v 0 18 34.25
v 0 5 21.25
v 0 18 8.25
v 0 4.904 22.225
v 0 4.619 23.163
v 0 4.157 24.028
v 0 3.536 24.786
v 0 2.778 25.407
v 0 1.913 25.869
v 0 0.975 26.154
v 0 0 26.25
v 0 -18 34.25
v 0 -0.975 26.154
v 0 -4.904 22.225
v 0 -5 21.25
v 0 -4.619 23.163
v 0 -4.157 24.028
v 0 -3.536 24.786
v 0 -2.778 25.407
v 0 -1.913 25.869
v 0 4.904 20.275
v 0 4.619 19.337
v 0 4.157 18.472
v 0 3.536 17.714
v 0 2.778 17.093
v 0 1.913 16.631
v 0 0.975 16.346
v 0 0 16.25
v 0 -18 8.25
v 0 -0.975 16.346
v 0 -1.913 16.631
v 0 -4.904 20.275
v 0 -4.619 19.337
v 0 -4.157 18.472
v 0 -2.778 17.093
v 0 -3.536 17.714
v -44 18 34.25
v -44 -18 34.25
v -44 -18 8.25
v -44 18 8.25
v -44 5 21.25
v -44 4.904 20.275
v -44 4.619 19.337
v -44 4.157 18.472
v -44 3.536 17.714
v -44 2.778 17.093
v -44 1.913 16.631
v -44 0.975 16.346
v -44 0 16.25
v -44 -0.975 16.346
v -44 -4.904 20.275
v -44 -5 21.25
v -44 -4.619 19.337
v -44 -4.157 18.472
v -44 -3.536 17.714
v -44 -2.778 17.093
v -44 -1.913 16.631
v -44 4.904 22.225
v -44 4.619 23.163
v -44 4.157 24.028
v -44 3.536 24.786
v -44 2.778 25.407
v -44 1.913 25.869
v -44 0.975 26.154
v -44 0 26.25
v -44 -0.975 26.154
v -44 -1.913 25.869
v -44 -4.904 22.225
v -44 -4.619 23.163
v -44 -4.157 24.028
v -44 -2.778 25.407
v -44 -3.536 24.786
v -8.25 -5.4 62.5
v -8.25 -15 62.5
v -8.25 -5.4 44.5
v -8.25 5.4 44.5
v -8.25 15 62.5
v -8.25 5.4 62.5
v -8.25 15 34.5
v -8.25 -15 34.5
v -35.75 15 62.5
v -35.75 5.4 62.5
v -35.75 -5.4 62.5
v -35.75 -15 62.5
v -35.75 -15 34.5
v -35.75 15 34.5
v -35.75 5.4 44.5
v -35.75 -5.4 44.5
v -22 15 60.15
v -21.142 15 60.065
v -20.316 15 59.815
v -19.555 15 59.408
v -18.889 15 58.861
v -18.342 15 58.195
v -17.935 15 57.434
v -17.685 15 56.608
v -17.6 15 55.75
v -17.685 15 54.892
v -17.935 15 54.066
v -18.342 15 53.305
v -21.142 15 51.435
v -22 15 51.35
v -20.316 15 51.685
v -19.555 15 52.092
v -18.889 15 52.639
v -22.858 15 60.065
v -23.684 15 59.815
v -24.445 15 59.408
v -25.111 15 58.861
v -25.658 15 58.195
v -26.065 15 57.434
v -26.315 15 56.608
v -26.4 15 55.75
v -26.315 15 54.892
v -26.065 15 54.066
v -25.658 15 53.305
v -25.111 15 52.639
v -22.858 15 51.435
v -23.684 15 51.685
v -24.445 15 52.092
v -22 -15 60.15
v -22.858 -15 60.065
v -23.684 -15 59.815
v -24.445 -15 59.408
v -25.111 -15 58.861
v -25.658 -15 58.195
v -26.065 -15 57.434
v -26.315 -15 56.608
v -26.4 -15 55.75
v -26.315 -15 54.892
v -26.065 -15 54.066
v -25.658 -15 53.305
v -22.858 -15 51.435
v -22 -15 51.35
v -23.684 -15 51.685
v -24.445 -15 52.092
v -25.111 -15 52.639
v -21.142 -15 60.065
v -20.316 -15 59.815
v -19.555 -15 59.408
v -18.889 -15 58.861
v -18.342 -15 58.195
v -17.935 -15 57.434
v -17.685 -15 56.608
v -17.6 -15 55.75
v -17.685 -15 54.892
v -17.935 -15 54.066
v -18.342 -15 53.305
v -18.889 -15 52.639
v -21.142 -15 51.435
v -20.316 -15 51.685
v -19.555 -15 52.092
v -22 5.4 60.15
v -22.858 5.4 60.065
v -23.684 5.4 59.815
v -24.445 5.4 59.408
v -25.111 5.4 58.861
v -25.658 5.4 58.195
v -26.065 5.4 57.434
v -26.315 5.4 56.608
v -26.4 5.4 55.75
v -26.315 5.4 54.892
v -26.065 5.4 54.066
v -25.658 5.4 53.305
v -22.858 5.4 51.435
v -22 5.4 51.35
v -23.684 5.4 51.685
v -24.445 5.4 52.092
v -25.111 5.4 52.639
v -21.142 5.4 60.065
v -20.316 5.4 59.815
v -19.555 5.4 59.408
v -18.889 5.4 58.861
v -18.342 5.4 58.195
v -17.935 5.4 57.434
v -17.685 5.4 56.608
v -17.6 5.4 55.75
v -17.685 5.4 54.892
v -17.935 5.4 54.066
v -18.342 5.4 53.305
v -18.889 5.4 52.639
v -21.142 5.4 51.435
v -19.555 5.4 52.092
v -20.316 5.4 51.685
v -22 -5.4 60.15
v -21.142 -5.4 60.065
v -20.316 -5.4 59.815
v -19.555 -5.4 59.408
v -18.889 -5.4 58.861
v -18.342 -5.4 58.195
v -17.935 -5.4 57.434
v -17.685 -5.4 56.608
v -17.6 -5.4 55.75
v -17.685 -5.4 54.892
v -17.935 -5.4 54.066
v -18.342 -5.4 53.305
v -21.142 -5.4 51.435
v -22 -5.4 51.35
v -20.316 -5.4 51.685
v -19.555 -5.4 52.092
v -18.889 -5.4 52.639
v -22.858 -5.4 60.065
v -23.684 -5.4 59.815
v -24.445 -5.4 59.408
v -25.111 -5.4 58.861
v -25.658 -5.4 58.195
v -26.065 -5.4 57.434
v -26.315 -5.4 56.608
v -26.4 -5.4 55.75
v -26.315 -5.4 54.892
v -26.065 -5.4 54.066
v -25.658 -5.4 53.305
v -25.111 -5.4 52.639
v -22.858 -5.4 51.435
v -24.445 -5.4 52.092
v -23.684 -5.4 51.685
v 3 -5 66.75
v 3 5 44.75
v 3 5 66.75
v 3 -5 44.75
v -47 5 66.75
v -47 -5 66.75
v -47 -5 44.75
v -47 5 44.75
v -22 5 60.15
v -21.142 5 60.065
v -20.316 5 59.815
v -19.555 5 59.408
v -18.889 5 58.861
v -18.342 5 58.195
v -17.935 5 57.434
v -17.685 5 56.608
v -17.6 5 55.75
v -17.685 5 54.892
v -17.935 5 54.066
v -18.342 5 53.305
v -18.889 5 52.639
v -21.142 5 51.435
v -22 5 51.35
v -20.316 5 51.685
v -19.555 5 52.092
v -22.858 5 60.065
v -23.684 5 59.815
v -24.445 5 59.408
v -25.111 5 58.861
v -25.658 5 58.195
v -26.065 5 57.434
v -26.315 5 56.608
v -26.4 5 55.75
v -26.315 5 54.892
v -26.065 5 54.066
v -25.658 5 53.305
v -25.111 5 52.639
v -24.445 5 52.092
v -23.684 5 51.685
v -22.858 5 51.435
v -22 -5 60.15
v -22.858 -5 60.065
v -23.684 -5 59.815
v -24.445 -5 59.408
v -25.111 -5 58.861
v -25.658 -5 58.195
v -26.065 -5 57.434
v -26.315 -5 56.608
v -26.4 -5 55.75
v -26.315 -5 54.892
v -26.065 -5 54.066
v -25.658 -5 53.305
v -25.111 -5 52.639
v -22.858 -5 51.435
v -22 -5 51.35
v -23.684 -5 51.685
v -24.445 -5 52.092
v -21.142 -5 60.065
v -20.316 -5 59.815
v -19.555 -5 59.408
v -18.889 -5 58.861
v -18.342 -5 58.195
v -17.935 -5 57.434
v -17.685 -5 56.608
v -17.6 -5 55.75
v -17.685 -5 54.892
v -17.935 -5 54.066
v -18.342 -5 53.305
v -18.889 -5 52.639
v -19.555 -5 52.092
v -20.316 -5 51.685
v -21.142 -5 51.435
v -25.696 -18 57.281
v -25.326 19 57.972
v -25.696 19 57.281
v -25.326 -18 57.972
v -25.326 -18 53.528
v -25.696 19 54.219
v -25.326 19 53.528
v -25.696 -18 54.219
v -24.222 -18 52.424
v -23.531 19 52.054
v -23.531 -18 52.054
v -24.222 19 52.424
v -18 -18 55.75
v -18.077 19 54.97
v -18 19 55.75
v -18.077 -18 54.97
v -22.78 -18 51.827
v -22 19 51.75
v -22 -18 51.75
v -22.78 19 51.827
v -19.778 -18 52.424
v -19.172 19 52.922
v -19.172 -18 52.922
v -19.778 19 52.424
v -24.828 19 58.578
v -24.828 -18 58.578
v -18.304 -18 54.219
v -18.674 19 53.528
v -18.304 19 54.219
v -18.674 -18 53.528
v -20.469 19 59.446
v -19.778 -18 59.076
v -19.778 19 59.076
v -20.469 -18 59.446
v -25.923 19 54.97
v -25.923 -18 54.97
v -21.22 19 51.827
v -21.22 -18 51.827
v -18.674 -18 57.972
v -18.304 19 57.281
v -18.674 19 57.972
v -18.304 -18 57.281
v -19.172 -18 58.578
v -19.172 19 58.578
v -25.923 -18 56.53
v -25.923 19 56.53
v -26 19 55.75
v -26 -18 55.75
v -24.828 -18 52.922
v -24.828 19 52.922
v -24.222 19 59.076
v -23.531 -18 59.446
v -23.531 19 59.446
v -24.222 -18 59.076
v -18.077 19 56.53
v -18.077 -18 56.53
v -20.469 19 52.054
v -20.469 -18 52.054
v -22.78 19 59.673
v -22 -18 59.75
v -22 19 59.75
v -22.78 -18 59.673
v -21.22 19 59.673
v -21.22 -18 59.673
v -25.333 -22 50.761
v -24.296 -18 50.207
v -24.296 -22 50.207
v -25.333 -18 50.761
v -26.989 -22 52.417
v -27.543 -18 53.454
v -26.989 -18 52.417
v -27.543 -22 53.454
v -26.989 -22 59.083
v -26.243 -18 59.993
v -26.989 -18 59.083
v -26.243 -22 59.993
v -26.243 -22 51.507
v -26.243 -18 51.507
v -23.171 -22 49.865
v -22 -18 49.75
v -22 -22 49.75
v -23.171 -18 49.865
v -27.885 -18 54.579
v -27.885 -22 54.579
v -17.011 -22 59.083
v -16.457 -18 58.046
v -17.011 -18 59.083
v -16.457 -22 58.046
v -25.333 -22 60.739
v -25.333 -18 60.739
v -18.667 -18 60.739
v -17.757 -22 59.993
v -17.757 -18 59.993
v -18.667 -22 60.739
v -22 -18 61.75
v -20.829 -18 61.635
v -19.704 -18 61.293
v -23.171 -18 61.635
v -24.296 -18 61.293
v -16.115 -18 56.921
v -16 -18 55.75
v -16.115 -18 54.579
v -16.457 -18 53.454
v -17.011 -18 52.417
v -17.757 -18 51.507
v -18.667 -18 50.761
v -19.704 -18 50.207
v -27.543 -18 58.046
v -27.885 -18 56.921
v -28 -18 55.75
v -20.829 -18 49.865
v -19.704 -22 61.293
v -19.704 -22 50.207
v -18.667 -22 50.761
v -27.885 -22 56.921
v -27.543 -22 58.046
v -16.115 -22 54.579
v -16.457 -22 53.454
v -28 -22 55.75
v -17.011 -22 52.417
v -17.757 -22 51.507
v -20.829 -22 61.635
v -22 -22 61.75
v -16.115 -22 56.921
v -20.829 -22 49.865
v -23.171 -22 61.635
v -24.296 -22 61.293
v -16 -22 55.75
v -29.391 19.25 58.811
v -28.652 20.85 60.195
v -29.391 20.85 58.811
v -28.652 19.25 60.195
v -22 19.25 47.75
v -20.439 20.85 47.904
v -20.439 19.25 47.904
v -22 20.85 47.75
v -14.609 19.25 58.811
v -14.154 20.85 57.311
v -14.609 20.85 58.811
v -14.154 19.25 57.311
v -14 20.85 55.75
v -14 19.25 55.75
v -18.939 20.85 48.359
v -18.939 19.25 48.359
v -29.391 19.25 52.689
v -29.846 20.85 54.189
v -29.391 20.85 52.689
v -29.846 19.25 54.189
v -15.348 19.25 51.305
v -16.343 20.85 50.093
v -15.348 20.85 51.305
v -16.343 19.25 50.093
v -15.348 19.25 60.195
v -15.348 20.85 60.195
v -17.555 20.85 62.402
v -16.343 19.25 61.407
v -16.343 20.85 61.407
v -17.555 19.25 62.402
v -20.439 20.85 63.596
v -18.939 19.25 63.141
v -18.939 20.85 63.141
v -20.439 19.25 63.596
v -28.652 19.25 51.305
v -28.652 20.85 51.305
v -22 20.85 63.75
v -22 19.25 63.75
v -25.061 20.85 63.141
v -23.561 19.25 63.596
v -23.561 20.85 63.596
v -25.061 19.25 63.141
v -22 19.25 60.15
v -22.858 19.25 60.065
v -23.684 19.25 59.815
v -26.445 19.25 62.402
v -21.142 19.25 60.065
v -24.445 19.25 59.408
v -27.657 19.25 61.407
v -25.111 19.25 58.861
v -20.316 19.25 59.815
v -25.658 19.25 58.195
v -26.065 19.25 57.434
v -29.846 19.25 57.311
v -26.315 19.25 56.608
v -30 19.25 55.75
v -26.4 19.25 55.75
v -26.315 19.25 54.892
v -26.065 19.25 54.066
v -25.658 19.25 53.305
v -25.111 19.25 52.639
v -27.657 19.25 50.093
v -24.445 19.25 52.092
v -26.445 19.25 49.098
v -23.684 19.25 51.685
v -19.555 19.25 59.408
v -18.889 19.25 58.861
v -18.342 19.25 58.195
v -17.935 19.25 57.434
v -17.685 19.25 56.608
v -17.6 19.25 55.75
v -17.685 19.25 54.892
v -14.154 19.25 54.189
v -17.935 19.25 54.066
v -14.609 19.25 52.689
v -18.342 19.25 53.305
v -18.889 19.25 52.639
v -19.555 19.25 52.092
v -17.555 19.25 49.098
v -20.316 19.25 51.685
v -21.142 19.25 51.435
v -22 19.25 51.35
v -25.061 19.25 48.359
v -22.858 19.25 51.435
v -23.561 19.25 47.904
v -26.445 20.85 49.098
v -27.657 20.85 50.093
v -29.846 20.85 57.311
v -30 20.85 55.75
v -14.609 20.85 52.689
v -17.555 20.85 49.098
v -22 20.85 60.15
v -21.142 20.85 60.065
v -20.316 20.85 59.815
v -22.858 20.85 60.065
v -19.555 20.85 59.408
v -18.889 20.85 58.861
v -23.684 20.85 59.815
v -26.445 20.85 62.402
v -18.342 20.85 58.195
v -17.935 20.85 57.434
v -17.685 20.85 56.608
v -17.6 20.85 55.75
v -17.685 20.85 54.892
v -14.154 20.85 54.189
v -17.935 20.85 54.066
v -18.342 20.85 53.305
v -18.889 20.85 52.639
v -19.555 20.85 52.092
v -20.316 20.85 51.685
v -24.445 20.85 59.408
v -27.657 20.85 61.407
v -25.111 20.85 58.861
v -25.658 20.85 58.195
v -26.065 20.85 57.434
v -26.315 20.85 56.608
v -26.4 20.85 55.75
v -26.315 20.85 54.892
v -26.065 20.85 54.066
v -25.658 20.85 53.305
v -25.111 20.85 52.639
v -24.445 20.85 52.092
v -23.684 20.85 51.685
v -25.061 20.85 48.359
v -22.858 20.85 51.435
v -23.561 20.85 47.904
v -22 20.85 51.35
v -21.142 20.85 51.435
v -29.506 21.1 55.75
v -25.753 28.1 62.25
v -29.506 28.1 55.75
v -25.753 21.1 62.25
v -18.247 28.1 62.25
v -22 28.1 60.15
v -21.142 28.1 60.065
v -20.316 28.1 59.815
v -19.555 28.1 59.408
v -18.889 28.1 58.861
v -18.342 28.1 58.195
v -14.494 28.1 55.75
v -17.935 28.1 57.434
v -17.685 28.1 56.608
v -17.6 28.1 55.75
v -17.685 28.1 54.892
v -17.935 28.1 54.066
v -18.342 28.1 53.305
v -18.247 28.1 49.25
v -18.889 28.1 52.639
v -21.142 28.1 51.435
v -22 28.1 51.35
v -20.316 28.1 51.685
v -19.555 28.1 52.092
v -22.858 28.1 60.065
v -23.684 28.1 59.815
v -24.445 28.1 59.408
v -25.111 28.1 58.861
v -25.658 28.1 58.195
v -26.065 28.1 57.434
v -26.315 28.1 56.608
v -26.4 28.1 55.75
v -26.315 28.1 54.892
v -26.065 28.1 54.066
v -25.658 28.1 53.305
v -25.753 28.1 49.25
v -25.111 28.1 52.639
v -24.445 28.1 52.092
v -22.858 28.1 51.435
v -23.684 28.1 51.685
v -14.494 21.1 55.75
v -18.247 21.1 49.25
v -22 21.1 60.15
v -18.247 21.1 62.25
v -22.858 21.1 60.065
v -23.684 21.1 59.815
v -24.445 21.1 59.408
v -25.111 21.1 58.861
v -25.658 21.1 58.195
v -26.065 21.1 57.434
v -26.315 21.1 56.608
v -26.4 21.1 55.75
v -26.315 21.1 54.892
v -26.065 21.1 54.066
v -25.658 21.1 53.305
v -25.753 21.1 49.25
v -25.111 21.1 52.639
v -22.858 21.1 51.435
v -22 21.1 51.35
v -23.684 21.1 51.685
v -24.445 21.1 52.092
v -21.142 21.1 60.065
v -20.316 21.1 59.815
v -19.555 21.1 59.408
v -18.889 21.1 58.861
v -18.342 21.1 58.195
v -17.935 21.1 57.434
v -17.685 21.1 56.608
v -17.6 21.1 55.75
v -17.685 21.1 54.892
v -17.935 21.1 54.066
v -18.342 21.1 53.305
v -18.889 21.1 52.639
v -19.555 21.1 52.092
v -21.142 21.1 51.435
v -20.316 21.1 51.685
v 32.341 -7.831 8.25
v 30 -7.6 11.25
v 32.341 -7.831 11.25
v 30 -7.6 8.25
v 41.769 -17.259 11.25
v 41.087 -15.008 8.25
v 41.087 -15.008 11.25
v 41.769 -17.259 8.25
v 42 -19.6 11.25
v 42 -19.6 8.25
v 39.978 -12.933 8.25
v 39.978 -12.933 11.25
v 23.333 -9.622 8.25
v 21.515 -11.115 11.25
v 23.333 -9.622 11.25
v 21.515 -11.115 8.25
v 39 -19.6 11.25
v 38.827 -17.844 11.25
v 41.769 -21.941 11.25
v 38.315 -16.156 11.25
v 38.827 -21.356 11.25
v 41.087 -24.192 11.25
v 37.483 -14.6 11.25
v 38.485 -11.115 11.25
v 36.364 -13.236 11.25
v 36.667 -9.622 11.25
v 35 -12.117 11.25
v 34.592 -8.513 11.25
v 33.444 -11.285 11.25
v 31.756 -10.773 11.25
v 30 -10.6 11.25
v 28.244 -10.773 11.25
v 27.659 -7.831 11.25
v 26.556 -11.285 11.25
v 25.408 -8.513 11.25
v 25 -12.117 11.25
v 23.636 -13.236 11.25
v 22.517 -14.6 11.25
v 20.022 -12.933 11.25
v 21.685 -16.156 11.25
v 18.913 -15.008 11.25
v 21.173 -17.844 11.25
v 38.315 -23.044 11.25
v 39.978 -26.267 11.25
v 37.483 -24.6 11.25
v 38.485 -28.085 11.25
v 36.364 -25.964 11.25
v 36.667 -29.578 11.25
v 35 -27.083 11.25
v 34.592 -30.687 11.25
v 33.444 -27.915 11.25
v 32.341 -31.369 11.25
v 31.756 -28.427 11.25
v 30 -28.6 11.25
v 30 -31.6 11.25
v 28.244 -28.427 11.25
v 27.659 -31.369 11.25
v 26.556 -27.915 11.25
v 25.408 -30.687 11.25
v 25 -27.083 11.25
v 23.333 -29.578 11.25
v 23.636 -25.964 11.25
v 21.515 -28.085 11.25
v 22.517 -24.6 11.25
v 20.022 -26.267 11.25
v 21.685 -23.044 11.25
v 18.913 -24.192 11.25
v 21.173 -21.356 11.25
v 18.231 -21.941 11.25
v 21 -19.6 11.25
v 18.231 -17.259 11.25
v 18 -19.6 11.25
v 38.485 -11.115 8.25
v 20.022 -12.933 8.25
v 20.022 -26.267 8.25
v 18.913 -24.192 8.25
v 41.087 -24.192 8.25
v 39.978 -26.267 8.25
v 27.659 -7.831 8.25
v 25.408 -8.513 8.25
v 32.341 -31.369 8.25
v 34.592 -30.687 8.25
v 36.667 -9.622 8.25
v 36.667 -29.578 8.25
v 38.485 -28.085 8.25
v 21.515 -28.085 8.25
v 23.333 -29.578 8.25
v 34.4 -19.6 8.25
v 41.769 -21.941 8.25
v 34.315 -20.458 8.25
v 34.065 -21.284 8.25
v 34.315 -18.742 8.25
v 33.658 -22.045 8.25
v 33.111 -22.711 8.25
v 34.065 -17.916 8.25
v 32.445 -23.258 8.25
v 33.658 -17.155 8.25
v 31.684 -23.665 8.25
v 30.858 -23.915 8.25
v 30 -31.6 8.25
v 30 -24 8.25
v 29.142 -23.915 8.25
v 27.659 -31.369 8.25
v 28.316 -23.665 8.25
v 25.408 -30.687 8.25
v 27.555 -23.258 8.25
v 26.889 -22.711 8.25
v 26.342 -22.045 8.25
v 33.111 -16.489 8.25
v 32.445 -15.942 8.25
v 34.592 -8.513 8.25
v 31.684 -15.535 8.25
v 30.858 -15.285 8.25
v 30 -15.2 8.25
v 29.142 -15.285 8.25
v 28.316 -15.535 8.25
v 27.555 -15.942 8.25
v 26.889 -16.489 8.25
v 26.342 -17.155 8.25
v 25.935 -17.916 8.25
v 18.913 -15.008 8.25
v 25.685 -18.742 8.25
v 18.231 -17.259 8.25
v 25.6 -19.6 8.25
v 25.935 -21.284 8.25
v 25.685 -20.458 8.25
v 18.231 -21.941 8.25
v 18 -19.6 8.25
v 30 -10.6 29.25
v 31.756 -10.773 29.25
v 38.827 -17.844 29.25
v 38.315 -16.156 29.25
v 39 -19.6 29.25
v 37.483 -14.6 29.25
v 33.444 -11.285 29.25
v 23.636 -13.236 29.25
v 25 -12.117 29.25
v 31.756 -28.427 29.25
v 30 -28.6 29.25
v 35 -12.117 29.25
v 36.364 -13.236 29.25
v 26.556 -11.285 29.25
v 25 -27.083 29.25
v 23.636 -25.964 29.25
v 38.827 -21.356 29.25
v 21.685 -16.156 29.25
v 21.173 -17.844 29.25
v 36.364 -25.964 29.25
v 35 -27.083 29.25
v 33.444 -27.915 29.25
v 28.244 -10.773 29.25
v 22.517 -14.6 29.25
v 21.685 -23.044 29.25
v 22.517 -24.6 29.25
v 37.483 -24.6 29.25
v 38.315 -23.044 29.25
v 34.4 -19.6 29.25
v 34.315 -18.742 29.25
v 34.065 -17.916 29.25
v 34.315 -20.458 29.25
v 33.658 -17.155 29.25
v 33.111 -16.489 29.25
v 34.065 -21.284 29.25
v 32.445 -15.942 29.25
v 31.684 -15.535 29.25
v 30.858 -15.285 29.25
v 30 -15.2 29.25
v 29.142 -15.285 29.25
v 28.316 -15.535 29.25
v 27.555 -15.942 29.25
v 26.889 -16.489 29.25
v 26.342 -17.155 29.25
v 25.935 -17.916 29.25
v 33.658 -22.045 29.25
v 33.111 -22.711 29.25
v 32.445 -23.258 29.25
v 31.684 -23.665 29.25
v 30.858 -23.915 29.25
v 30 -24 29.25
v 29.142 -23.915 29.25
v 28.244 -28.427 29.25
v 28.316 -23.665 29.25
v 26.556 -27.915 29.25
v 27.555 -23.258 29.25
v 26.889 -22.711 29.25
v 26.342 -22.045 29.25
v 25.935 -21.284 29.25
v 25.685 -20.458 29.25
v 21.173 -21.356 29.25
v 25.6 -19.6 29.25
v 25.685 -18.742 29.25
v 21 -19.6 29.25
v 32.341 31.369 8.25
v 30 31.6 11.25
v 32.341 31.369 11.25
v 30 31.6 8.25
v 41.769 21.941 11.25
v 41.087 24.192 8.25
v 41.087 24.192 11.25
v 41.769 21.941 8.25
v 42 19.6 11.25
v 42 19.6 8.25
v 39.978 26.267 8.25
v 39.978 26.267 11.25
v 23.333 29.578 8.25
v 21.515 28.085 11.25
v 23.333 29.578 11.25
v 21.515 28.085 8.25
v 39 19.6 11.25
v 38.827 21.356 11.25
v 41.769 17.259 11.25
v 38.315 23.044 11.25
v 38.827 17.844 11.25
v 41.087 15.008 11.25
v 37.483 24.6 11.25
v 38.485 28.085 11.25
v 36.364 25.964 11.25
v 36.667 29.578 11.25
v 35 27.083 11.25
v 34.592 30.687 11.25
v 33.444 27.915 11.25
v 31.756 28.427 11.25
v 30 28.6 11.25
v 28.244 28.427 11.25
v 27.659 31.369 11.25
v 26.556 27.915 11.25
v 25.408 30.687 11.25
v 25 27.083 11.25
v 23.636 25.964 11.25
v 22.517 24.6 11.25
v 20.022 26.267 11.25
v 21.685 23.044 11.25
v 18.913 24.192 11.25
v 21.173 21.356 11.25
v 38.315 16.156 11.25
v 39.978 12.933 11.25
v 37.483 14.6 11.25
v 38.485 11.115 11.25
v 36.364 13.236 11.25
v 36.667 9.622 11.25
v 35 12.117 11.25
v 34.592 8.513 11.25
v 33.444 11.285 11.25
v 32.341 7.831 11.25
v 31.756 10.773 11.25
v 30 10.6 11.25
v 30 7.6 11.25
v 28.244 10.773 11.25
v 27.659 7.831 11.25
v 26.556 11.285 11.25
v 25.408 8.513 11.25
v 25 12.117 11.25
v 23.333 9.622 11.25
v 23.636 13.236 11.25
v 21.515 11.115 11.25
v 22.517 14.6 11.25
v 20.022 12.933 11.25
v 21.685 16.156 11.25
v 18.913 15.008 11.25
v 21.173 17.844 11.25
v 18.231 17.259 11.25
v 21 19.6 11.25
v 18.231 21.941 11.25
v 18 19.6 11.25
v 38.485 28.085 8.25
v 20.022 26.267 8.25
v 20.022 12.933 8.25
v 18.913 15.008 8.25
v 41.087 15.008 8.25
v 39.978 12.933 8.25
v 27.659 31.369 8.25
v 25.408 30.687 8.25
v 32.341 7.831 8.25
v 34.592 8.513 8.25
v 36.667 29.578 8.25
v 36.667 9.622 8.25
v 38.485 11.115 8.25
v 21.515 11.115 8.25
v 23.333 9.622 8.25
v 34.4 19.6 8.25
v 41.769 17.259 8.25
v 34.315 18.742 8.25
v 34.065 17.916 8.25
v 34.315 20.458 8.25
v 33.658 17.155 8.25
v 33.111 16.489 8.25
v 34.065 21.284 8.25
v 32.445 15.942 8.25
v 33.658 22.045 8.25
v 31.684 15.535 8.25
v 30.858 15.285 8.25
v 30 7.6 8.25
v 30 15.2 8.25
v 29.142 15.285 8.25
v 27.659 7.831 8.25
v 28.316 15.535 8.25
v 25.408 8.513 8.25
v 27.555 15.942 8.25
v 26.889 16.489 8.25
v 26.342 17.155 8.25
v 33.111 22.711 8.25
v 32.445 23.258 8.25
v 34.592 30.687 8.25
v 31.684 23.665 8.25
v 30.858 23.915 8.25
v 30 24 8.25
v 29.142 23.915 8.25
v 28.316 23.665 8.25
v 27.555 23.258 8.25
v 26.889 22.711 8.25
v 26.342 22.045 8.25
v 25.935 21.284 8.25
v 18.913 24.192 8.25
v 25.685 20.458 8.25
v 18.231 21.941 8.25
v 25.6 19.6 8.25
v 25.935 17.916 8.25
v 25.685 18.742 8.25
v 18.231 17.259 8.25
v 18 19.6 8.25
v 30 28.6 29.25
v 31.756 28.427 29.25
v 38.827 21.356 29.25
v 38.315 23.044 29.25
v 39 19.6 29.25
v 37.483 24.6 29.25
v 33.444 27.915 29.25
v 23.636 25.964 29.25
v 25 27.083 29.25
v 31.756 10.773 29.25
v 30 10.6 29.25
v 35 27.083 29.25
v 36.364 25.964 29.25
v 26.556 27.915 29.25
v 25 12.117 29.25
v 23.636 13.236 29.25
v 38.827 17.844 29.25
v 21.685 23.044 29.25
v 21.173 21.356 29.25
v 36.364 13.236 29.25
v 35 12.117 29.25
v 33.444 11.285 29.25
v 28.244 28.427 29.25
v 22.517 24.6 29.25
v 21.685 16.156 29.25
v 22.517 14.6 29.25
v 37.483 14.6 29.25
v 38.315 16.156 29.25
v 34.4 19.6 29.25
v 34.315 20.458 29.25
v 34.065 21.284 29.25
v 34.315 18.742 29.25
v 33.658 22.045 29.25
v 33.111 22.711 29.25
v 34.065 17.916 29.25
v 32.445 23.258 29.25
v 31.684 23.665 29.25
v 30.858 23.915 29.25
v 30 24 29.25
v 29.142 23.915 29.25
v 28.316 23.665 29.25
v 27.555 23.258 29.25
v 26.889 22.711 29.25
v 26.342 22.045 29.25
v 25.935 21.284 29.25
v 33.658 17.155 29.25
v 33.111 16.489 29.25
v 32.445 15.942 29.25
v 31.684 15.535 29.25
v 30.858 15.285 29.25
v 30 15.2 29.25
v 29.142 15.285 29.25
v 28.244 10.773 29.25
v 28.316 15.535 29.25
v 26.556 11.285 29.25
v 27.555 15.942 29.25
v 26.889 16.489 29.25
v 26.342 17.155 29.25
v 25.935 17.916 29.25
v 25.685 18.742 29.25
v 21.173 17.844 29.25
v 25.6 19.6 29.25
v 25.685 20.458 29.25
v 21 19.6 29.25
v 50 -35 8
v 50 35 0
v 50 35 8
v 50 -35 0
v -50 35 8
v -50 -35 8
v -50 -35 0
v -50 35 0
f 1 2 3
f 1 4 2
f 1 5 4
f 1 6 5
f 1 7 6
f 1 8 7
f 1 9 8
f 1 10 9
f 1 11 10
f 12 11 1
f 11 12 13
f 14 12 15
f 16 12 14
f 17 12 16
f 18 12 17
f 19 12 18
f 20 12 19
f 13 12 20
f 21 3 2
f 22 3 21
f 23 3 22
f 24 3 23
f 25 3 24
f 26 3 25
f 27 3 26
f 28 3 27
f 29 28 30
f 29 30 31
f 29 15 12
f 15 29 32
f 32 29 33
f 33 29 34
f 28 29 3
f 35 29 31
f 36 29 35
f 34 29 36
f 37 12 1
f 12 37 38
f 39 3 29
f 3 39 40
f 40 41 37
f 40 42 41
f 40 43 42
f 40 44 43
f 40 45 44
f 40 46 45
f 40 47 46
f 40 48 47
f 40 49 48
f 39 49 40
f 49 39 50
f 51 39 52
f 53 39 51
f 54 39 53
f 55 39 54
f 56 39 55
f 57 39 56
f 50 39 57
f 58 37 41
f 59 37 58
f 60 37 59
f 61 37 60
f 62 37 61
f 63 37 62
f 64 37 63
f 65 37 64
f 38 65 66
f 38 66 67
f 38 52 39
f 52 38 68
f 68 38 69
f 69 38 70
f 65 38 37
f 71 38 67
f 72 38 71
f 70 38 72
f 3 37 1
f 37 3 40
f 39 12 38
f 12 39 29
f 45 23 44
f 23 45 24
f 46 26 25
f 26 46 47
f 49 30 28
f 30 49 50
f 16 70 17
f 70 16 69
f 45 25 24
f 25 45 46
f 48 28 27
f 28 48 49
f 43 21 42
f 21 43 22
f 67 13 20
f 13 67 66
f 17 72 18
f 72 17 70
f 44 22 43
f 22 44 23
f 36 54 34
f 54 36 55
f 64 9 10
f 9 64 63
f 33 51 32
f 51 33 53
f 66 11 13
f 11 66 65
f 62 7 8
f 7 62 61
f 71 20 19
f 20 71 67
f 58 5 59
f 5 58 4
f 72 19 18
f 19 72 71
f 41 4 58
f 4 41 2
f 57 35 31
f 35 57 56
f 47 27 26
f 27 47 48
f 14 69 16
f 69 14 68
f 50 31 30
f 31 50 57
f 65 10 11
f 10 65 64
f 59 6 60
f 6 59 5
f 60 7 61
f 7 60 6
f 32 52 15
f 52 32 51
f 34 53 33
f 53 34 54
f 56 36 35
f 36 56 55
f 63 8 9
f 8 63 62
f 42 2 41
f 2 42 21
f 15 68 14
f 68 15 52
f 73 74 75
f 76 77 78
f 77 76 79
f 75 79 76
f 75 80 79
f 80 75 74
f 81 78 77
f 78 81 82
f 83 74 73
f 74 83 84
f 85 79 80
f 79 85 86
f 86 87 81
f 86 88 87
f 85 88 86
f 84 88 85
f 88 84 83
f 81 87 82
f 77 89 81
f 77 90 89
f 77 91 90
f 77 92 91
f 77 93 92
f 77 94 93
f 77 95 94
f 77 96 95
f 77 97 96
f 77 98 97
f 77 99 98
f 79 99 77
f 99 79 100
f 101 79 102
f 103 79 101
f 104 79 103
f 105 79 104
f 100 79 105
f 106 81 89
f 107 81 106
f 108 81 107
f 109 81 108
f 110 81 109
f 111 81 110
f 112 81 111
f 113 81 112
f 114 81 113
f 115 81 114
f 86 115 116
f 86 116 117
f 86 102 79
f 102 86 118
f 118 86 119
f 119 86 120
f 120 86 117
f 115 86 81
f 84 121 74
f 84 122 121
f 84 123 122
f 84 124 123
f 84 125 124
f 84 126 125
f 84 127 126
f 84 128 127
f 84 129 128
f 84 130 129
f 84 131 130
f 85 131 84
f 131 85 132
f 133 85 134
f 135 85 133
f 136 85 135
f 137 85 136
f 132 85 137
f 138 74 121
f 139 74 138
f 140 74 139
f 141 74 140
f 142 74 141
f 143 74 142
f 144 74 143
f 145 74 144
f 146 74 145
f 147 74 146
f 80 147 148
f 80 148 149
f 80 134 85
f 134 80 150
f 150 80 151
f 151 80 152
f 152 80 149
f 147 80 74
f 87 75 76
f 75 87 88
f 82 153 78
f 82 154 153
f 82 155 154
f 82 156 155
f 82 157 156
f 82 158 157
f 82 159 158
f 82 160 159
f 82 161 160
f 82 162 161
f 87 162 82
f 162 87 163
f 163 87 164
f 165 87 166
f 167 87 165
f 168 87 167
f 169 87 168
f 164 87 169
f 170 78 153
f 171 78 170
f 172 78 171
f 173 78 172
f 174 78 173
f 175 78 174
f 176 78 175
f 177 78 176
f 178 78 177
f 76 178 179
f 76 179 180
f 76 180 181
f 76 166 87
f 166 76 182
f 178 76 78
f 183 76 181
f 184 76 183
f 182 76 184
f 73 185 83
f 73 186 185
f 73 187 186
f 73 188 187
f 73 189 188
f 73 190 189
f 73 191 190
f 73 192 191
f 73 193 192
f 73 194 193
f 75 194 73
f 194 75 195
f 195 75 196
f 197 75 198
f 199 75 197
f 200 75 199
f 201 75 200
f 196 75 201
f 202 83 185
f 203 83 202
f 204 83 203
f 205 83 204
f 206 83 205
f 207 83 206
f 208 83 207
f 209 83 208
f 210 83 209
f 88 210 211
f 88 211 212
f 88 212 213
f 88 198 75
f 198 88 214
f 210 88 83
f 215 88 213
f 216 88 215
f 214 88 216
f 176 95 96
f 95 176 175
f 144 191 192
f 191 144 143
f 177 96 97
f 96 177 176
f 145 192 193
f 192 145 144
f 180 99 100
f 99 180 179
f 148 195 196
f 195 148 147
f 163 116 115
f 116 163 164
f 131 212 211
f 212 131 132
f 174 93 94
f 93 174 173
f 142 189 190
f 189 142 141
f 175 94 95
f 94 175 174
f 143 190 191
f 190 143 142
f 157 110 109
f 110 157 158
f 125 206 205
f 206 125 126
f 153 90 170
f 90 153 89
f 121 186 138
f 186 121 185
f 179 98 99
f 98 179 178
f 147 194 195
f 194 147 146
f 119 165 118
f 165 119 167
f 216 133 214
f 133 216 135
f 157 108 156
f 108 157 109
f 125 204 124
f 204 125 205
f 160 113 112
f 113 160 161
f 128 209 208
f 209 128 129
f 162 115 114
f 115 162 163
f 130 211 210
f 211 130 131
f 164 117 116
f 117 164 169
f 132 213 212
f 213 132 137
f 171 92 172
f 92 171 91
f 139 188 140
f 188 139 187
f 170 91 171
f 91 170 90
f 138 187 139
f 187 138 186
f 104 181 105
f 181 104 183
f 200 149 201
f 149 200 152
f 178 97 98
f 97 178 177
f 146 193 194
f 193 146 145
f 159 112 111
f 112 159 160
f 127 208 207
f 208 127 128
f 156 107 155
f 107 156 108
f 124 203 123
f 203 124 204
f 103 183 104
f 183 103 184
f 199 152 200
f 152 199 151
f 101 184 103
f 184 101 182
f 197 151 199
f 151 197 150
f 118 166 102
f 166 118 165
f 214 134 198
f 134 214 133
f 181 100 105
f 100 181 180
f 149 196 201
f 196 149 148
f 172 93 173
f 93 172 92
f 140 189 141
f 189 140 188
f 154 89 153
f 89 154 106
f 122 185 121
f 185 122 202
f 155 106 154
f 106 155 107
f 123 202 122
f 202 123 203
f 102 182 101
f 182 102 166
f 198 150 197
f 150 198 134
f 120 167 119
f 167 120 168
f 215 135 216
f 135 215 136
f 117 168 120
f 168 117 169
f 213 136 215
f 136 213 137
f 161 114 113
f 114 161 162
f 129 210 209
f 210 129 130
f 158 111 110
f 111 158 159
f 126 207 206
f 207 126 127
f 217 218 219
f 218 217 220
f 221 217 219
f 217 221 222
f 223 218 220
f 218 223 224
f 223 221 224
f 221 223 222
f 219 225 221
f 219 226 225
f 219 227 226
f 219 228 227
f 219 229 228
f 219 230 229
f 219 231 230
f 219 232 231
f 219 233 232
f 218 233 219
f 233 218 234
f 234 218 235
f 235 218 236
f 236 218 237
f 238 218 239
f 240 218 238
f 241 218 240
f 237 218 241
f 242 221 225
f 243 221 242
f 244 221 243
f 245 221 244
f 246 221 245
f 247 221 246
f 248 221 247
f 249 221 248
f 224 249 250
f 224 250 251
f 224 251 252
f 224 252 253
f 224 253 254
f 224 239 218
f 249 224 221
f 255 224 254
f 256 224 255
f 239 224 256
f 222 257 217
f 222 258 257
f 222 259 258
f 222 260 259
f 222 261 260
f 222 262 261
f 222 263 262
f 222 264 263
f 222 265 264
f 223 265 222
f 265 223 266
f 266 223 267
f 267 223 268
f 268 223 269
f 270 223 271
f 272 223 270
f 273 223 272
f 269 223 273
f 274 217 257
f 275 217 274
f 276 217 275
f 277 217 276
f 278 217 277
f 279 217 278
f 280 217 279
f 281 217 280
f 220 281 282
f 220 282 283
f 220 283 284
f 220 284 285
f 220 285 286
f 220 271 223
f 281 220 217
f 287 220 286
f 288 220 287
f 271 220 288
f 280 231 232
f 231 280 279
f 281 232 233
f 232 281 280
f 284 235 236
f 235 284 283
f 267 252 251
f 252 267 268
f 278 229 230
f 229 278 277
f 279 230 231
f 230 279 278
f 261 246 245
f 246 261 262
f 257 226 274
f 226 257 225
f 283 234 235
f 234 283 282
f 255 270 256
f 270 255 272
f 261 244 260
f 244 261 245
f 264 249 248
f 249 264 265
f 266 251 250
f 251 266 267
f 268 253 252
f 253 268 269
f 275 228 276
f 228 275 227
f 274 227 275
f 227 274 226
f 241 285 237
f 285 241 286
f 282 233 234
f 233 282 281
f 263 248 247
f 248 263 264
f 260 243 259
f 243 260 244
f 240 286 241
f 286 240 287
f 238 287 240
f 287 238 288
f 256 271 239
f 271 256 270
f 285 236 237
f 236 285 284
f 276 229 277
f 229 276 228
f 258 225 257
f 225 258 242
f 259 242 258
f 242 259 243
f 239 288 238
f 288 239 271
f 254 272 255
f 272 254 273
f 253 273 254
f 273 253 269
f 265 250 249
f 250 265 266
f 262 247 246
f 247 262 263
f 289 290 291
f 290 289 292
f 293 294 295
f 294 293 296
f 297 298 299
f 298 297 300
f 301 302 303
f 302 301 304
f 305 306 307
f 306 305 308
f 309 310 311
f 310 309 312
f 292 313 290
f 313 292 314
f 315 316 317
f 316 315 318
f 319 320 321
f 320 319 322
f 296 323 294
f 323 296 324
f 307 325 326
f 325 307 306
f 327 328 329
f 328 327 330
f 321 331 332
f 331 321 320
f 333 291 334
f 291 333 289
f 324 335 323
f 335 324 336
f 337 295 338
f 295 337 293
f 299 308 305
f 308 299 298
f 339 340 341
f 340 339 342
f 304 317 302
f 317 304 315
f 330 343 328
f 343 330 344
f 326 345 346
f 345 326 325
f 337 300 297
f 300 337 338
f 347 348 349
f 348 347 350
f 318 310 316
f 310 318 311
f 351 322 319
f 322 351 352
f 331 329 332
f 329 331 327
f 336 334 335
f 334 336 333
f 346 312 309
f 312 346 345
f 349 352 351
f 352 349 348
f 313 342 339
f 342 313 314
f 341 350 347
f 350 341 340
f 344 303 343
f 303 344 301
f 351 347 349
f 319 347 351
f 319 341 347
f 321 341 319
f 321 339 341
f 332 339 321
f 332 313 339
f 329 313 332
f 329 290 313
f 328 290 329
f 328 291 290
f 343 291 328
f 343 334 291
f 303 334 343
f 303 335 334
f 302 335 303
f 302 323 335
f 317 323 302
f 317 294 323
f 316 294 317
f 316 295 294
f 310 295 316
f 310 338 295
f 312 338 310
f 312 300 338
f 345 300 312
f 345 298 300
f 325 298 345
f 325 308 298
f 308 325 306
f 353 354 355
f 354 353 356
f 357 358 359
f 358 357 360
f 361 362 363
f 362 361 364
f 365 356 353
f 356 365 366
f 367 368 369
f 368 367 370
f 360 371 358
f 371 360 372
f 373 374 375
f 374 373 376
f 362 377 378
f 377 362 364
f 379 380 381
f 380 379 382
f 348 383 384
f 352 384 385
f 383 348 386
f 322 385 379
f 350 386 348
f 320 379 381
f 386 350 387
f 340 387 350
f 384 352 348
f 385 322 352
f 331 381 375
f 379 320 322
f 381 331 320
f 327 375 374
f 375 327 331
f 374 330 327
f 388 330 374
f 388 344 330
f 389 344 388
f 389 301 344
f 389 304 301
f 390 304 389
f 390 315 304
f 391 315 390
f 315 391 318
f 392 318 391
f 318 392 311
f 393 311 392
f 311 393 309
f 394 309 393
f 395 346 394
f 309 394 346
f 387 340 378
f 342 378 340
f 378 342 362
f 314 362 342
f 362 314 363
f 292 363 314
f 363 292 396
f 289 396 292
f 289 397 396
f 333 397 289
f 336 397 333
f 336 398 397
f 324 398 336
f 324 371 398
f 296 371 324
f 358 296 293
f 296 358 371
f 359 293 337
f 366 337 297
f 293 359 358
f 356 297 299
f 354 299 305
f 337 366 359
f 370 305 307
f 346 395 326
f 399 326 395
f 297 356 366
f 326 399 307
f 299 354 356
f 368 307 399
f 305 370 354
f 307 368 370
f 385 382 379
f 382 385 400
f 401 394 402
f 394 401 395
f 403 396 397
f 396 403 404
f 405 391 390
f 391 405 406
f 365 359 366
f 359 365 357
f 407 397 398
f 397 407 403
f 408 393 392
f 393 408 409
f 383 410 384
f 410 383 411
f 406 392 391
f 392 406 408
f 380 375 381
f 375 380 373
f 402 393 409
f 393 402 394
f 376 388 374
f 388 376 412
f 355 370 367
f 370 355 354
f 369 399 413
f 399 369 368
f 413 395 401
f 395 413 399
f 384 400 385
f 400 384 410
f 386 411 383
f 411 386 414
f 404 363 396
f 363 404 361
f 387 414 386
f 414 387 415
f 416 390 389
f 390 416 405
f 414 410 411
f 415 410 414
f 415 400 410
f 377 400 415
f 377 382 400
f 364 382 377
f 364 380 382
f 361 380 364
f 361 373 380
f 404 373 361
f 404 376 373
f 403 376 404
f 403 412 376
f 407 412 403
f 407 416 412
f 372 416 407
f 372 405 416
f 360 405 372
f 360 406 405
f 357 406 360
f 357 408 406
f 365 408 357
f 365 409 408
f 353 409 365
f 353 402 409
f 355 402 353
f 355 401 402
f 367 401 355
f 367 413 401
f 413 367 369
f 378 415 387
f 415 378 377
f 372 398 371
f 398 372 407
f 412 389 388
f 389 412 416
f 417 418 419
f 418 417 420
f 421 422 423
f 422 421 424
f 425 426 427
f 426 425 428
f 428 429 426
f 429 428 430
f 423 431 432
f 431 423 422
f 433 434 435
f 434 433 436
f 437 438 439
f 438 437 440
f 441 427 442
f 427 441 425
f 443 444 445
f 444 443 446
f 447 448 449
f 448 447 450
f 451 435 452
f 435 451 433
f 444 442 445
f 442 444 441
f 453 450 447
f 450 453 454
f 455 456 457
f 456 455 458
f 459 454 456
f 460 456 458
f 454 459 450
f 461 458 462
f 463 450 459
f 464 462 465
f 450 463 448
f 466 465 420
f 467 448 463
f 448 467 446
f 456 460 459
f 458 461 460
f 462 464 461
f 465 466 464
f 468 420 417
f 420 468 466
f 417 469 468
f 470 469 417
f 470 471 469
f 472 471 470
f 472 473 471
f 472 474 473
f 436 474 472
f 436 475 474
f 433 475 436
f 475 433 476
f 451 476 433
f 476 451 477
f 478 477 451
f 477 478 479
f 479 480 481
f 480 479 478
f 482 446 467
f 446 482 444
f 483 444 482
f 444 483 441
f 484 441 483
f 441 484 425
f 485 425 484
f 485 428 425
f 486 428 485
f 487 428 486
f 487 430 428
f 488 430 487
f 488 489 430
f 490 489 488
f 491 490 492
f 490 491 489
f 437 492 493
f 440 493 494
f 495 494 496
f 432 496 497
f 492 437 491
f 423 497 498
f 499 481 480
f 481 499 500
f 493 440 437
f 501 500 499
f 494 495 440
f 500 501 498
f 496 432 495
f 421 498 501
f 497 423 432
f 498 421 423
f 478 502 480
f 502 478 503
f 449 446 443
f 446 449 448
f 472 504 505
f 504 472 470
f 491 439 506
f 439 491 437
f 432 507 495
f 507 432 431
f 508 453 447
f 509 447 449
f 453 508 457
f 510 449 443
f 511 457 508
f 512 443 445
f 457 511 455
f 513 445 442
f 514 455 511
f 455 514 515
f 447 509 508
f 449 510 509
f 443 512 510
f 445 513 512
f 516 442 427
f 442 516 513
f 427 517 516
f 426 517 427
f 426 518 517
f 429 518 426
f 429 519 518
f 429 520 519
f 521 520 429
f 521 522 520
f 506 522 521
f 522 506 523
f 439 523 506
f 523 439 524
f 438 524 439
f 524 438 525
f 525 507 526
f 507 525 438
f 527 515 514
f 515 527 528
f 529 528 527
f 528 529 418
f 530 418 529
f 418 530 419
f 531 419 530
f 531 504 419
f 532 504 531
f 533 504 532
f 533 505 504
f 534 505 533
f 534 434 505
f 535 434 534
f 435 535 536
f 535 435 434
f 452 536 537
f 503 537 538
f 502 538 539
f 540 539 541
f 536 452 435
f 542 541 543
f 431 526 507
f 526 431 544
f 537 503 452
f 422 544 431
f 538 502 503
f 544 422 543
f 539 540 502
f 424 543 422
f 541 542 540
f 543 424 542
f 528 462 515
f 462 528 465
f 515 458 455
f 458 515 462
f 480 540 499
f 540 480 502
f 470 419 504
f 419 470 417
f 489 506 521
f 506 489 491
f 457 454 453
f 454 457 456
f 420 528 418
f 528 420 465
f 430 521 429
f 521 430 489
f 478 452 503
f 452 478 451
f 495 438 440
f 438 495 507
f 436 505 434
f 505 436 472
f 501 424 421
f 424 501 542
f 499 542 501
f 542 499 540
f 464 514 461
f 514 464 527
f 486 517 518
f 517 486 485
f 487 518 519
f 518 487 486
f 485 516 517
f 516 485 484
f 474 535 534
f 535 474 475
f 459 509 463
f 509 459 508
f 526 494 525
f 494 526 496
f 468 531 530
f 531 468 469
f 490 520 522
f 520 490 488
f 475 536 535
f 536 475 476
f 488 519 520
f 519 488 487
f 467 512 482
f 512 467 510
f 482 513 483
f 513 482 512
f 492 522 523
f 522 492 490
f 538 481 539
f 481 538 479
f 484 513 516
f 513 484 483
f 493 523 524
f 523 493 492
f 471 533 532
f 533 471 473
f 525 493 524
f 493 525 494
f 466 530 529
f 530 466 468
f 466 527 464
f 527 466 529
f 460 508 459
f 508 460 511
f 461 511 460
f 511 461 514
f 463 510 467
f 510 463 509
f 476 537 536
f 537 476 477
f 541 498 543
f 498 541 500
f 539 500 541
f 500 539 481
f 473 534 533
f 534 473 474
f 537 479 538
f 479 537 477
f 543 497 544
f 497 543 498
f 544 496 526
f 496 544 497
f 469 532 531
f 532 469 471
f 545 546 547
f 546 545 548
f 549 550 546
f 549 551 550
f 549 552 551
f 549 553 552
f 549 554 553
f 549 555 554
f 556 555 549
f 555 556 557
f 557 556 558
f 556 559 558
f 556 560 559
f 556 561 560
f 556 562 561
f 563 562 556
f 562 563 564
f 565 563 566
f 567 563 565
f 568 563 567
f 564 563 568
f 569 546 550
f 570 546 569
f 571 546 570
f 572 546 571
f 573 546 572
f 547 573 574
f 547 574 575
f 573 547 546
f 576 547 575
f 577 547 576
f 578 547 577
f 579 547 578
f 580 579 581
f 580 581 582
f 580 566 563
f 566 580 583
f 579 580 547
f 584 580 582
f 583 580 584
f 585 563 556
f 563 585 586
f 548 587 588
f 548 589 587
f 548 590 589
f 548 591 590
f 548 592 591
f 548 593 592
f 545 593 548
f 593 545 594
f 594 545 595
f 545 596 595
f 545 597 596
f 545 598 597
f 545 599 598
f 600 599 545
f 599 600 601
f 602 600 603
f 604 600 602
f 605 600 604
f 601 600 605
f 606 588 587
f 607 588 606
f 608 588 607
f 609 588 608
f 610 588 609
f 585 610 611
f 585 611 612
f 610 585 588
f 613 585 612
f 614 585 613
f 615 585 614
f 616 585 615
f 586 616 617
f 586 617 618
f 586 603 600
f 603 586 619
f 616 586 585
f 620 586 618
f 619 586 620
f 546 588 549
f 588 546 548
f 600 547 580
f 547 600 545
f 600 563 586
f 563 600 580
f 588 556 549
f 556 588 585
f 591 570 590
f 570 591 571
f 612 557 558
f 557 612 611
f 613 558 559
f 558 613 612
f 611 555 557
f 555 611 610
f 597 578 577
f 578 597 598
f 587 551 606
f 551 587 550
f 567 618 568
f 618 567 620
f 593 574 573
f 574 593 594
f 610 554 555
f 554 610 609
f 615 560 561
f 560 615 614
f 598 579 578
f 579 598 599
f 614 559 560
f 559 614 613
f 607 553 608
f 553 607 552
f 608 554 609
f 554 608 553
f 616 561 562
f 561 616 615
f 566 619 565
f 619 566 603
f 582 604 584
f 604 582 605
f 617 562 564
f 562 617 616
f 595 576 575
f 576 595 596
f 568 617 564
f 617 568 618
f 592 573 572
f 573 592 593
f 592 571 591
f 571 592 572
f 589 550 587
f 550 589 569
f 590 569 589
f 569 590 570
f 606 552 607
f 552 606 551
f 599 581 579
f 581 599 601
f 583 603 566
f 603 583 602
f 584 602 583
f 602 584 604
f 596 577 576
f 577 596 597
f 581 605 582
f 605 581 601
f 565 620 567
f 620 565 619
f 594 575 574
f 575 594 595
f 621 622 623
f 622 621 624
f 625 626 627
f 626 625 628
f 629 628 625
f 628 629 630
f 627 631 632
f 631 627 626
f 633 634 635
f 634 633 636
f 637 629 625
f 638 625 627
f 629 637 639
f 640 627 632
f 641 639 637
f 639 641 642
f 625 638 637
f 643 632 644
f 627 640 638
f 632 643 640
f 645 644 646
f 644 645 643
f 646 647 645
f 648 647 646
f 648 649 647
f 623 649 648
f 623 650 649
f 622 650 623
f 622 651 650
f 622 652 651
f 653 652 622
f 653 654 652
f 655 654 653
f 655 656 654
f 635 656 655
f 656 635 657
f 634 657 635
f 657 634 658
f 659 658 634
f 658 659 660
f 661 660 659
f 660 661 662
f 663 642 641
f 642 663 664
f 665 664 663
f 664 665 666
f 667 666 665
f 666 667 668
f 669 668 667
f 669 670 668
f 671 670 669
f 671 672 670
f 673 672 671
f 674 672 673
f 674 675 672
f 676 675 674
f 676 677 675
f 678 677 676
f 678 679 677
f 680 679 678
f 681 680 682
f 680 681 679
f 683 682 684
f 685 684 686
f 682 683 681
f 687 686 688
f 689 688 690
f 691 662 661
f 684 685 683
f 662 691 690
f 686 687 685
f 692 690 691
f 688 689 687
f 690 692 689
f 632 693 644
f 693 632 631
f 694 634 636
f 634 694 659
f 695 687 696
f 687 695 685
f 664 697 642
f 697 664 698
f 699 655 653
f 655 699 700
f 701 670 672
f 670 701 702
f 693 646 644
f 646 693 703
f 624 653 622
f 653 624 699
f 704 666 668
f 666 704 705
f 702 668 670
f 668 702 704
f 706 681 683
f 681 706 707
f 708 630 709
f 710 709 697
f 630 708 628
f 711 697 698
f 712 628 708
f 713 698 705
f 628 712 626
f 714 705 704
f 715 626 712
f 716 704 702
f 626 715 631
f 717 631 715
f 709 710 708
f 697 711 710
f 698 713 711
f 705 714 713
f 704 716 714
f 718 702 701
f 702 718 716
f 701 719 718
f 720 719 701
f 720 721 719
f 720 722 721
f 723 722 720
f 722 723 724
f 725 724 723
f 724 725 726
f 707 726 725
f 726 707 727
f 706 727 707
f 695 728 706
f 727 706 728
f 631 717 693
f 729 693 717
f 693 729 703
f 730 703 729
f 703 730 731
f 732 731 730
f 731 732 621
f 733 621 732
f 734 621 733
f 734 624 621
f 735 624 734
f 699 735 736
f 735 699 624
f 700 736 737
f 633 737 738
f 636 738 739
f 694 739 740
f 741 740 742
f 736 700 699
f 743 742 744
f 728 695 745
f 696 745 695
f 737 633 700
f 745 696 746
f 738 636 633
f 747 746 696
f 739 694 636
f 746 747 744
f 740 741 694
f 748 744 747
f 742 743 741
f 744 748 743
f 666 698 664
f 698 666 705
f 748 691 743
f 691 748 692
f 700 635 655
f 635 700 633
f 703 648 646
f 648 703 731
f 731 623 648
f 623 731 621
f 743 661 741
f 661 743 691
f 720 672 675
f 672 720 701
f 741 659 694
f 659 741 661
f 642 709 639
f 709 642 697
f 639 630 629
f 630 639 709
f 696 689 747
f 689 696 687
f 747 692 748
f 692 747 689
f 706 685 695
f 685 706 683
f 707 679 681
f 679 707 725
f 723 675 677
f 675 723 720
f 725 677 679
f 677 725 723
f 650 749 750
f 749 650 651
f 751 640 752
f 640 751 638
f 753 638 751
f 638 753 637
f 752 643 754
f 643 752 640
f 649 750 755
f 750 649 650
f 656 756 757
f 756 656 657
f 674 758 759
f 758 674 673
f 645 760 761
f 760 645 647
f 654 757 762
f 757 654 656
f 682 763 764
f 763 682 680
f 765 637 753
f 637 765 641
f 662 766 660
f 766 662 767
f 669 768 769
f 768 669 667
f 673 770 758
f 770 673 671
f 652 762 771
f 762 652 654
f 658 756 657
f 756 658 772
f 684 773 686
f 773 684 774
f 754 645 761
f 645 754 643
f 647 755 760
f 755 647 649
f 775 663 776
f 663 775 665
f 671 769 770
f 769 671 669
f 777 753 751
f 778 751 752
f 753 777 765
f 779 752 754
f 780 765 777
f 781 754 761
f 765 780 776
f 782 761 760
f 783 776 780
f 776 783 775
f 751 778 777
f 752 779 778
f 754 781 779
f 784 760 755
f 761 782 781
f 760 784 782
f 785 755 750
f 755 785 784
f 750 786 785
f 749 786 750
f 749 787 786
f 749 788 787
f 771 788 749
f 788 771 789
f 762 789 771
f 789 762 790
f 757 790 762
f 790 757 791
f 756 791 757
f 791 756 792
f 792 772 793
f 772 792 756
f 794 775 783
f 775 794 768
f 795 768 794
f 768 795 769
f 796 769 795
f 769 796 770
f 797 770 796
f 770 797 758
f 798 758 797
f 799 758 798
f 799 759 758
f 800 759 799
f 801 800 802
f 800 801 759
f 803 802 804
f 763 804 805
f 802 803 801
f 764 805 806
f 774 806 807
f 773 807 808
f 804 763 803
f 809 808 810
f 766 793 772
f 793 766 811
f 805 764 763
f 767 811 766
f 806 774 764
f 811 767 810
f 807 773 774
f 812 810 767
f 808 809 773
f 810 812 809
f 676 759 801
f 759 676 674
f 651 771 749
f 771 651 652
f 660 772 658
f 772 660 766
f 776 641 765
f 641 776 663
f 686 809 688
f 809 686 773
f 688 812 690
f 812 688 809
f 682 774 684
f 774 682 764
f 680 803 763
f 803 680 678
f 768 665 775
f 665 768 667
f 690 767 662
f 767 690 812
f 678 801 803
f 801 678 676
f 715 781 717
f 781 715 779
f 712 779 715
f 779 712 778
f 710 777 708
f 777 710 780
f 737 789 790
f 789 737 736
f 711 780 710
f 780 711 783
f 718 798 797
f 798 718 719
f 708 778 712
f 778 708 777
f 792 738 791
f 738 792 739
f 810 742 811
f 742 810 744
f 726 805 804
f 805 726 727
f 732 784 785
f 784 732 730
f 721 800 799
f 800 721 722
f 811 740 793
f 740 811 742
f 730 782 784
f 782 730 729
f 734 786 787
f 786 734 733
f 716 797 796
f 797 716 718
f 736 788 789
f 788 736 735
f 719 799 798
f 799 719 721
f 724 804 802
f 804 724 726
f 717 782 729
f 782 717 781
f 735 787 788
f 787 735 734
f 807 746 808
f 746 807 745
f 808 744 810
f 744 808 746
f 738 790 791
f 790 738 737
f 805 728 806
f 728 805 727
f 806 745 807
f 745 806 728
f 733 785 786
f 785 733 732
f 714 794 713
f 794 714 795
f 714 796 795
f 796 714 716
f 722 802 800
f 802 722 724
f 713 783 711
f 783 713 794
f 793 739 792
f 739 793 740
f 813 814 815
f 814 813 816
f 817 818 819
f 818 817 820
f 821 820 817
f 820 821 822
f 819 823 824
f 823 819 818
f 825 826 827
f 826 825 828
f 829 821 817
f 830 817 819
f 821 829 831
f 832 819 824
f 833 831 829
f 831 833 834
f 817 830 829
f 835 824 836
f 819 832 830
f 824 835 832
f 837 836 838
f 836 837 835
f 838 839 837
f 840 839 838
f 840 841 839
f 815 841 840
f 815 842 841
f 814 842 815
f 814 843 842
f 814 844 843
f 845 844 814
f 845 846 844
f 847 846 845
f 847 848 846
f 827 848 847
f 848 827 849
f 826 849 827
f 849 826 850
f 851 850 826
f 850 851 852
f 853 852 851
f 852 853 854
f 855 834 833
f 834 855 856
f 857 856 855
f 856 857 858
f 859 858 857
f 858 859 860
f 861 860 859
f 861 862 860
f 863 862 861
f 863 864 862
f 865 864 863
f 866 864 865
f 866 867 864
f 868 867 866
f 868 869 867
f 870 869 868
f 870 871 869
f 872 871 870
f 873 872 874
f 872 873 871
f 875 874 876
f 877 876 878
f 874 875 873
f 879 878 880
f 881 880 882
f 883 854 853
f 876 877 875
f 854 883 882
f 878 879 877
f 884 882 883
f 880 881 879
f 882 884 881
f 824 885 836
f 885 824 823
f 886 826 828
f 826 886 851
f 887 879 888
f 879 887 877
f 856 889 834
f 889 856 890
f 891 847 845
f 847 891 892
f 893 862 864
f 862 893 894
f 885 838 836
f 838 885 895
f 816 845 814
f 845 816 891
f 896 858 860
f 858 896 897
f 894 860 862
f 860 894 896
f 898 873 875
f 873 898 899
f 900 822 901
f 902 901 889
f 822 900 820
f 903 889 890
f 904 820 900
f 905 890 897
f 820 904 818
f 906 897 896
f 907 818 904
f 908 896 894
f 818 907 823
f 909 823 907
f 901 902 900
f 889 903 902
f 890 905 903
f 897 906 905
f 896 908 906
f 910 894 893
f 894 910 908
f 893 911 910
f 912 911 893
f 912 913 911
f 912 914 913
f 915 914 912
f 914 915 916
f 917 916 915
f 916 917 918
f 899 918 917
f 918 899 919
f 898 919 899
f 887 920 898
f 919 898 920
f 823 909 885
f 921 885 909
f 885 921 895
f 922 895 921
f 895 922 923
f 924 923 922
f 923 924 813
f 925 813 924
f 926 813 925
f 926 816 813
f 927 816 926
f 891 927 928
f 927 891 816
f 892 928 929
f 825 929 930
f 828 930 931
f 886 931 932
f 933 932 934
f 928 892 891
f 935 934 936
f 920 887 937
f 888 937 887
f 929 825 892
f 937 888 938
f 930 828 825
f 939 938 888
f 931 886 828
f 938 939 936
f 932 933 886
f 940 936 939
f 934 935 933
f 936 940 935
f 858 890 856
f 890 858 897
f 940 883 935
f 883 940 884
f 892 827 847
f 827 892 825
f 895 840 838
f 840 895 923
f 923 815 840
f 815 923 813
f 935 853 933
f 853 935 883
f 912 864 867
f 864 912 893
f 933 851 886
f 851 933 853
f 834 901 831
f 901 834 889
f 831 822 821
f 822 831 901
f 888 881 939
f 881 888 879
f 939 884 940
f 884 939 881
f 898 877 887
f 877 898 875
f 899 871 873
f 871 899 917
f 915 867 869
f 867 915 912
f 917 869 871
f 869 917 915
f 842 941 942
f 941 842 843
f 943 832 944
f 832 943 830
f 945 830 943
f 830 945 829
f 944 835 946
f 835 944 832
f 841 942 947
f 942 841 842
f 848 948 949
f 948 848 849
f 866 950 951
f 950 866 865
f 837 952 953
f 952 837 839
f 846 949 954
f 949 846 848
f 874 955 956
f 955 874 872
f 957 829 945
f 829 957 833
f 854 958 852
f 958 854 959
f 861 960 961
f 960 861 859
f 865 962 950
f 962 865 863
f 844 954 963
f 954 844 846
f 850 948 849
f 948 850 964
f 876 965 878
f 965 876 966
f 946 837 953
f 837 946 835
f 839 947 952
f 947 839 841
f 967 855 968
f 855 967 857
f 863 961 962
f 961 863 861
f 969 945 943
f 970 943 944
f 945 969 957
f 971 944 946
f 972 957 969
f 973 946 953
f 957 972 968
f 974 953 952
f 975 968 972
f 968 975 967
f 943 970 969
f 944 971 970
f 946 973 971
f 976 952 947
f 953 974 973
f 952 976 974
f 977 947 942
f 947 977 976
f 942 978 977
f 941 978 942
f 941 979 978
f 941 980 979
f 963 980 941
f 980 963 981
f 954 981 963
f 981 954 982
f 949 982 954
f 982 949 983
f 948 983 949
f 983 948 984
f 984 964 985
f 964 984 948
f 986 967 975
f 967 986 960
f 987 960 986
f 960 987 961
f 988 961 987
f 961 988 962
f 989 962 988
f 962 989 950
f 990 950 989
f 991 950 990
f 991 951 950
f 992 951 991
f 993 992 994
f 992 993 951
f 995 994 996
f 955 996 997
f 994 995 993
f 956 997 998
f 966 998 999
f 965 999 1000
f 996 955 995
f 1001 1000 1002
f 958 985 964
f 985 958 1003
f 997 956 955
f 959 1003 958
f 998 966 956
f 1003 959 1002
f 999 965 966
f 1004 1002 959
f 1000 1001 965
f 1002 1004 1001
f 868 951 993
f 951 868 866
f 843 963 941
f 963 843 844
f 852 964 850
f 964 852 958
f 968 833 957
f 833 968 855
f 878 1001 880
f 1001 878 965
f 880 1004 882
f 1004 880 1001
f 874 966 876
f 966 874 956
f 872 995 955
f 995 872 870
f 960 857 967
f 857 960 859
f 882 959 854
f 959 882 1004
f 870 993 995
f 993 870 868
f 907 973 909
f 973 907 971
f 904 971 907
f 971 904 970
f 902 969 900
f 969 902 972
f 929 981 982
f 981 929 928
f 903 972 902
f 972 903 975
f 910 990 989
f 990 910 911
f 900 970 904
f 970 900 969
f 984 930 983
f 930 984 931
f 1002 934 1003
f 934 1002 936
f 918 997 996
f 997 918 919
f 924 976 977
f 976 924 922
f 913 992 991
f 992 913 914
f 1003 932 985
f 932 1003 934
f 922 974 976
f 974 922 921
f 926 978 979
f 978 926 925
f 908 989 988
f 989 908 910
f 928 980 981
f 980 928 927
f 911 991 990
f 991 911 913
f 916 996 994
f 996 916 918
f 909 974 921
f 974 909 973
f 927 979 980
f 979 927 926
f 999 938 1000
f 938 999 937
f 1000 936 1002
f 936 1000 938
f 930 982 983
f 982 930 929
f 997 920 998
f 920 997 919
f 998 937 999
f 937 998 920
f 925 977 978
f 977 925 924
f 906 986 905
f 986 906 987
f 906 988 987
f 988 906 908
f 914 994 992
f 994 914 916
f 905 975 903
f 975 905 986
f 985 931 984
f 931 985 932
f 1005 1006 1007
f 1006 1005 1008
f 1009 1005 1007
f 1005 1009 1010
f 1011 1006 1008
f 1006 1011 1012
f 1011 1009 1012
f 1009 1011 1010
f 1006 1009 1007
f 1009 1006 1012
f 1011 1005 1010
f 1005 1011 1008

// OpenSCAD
$fn = 32;

// ------------------------------------------------------------------------
// Indexing jig: plate 100 x 70 mm, pin d8
// Every part is its own module, assembly() places every instance.
// ------------------------------------------------------------------------

// --- part 1 ---
module jig_plate() {
  difference() {
    translate([-50, -35, 0]) cube([100, 70, 8]);
  }
}

// --- part 2 ---
module locator_block() {
  difference() {
    translate([-22, -18, 0]) cube([44, 36, 26]);
    translate([0, 0, 13]) rotate([0, 90, 0]) cylinder(h = 46, d = 10, center = true);
  }
}

// --- part 3 ---
module index_fork() {
  difference() {
    translate([-13.75, -15, 0]) cube([27.5, 30, 28]);
    translate([-14.75, -5.4, 10]) cube([29.5, 10.8, 19]);
    translate([0, 0, 21.25]) rotate([90, 0, 0]) cylinder(h = 32, d = 8.8, center = true);
  }
}

// --- part 4 ---
module index_arm() {
  difference() {
    translate([-25, -5, 0]) cube([50, 10, 22]);
    translate([0, 0, 11]) rotate([90, 0, 0]) cylinder(h = 12, d = 8.8, center = true);
  }
}

// --- part 5 ---
module index_pin() {
  rotate([0, 90, 0]) cylinder(h = 38, d = 8, center = true);
  translate([-22, 0, 0]) rotate([0, 90, 0]) cylinder(h = 4, d = 12);
}

// --- part 6 ---
module pin_washer() {
  difference() {
      translate([0, 0, 0]) cylinder(h = 1.6, d = 16);
      translate([0, 0, -1]) cylinder(h = 3.6, d = 8.8);
    }
}

// --- part 7 ---
module lock_nut() {
  difference() {
    linear_extrude(height = 7) polygon(points = [[7.506, 0], [3.753, 6.5], [-3.753, 6.5], [-7.506, 0], [-3.753, -6.5], [3.753, -6.5]]);
    translate([0, 0, -1]) cylinder(h = 9, d = 8.8);
  }
}

// --- part 8 ---
module guide_bush_a() {
  difference() {
    union() {
      cylinder(h = 3, d = 24);
      translate([0, 0, 3]) cylinder(h = 18, d = 18);
    }
    translate([0, 0, -1]) cylinder(h = 23, d = 8.8);
  }
}

// --- part 9 ---
module guide_bush_b() {
  difference() {
    union() {
      cylinder(h = 3, d = 24);
      translate([0, 0, 3]) cylinder(h = 18, d = 18);
    }
    translate([0, 0, -1]) cylinder(h = 23, d = 8.8);
  }
}

// --- assembly ---
module assembly() {
  color([0.80, 0.24, 0.20]) translate([0, 0, 0]) rotate([0, 0, 0]) jig_plate();
  color([0.20, 0.45, 0.75]) translate([-22, 0, 8.25]) rotate([0, 0, 0]) locator_block();
  color([0.25, 0.62, 0.32]) translate([-22, 0, 34.5]) rotate([0, 0, 0]) index_fork();
  color([0.92, 0.70, 0.18]) translate([-22, 0, 44.75]) rotate([0, 0, 0]) index_arm();
  color([0.58, 0.35, 0.70]) translate([-22, 0, 55.75]) rotate([0, 0, 90]) index_pin();
  color([0.16, 0.66, 0.66]) translate([-22, 20.85, 55.75]) rotate([90, 0, 0]) pin_washer();
  color([0.85, 0.48, 0.18]) translate([-22, 28.1, 55.75]) rotate([90, 0, 0]) lock_nut();
  color([0.55, 0.60, 0.65]) translate([30, -19.6, 8.25]) rotate([0, 0, 0]) guide_bush_a();
  color([0.75, 0.30, 0.55]) translate([30, 19.6, 8.25]) rotate([0, 0, 0]) guide_bush_b();
}

assembly();
